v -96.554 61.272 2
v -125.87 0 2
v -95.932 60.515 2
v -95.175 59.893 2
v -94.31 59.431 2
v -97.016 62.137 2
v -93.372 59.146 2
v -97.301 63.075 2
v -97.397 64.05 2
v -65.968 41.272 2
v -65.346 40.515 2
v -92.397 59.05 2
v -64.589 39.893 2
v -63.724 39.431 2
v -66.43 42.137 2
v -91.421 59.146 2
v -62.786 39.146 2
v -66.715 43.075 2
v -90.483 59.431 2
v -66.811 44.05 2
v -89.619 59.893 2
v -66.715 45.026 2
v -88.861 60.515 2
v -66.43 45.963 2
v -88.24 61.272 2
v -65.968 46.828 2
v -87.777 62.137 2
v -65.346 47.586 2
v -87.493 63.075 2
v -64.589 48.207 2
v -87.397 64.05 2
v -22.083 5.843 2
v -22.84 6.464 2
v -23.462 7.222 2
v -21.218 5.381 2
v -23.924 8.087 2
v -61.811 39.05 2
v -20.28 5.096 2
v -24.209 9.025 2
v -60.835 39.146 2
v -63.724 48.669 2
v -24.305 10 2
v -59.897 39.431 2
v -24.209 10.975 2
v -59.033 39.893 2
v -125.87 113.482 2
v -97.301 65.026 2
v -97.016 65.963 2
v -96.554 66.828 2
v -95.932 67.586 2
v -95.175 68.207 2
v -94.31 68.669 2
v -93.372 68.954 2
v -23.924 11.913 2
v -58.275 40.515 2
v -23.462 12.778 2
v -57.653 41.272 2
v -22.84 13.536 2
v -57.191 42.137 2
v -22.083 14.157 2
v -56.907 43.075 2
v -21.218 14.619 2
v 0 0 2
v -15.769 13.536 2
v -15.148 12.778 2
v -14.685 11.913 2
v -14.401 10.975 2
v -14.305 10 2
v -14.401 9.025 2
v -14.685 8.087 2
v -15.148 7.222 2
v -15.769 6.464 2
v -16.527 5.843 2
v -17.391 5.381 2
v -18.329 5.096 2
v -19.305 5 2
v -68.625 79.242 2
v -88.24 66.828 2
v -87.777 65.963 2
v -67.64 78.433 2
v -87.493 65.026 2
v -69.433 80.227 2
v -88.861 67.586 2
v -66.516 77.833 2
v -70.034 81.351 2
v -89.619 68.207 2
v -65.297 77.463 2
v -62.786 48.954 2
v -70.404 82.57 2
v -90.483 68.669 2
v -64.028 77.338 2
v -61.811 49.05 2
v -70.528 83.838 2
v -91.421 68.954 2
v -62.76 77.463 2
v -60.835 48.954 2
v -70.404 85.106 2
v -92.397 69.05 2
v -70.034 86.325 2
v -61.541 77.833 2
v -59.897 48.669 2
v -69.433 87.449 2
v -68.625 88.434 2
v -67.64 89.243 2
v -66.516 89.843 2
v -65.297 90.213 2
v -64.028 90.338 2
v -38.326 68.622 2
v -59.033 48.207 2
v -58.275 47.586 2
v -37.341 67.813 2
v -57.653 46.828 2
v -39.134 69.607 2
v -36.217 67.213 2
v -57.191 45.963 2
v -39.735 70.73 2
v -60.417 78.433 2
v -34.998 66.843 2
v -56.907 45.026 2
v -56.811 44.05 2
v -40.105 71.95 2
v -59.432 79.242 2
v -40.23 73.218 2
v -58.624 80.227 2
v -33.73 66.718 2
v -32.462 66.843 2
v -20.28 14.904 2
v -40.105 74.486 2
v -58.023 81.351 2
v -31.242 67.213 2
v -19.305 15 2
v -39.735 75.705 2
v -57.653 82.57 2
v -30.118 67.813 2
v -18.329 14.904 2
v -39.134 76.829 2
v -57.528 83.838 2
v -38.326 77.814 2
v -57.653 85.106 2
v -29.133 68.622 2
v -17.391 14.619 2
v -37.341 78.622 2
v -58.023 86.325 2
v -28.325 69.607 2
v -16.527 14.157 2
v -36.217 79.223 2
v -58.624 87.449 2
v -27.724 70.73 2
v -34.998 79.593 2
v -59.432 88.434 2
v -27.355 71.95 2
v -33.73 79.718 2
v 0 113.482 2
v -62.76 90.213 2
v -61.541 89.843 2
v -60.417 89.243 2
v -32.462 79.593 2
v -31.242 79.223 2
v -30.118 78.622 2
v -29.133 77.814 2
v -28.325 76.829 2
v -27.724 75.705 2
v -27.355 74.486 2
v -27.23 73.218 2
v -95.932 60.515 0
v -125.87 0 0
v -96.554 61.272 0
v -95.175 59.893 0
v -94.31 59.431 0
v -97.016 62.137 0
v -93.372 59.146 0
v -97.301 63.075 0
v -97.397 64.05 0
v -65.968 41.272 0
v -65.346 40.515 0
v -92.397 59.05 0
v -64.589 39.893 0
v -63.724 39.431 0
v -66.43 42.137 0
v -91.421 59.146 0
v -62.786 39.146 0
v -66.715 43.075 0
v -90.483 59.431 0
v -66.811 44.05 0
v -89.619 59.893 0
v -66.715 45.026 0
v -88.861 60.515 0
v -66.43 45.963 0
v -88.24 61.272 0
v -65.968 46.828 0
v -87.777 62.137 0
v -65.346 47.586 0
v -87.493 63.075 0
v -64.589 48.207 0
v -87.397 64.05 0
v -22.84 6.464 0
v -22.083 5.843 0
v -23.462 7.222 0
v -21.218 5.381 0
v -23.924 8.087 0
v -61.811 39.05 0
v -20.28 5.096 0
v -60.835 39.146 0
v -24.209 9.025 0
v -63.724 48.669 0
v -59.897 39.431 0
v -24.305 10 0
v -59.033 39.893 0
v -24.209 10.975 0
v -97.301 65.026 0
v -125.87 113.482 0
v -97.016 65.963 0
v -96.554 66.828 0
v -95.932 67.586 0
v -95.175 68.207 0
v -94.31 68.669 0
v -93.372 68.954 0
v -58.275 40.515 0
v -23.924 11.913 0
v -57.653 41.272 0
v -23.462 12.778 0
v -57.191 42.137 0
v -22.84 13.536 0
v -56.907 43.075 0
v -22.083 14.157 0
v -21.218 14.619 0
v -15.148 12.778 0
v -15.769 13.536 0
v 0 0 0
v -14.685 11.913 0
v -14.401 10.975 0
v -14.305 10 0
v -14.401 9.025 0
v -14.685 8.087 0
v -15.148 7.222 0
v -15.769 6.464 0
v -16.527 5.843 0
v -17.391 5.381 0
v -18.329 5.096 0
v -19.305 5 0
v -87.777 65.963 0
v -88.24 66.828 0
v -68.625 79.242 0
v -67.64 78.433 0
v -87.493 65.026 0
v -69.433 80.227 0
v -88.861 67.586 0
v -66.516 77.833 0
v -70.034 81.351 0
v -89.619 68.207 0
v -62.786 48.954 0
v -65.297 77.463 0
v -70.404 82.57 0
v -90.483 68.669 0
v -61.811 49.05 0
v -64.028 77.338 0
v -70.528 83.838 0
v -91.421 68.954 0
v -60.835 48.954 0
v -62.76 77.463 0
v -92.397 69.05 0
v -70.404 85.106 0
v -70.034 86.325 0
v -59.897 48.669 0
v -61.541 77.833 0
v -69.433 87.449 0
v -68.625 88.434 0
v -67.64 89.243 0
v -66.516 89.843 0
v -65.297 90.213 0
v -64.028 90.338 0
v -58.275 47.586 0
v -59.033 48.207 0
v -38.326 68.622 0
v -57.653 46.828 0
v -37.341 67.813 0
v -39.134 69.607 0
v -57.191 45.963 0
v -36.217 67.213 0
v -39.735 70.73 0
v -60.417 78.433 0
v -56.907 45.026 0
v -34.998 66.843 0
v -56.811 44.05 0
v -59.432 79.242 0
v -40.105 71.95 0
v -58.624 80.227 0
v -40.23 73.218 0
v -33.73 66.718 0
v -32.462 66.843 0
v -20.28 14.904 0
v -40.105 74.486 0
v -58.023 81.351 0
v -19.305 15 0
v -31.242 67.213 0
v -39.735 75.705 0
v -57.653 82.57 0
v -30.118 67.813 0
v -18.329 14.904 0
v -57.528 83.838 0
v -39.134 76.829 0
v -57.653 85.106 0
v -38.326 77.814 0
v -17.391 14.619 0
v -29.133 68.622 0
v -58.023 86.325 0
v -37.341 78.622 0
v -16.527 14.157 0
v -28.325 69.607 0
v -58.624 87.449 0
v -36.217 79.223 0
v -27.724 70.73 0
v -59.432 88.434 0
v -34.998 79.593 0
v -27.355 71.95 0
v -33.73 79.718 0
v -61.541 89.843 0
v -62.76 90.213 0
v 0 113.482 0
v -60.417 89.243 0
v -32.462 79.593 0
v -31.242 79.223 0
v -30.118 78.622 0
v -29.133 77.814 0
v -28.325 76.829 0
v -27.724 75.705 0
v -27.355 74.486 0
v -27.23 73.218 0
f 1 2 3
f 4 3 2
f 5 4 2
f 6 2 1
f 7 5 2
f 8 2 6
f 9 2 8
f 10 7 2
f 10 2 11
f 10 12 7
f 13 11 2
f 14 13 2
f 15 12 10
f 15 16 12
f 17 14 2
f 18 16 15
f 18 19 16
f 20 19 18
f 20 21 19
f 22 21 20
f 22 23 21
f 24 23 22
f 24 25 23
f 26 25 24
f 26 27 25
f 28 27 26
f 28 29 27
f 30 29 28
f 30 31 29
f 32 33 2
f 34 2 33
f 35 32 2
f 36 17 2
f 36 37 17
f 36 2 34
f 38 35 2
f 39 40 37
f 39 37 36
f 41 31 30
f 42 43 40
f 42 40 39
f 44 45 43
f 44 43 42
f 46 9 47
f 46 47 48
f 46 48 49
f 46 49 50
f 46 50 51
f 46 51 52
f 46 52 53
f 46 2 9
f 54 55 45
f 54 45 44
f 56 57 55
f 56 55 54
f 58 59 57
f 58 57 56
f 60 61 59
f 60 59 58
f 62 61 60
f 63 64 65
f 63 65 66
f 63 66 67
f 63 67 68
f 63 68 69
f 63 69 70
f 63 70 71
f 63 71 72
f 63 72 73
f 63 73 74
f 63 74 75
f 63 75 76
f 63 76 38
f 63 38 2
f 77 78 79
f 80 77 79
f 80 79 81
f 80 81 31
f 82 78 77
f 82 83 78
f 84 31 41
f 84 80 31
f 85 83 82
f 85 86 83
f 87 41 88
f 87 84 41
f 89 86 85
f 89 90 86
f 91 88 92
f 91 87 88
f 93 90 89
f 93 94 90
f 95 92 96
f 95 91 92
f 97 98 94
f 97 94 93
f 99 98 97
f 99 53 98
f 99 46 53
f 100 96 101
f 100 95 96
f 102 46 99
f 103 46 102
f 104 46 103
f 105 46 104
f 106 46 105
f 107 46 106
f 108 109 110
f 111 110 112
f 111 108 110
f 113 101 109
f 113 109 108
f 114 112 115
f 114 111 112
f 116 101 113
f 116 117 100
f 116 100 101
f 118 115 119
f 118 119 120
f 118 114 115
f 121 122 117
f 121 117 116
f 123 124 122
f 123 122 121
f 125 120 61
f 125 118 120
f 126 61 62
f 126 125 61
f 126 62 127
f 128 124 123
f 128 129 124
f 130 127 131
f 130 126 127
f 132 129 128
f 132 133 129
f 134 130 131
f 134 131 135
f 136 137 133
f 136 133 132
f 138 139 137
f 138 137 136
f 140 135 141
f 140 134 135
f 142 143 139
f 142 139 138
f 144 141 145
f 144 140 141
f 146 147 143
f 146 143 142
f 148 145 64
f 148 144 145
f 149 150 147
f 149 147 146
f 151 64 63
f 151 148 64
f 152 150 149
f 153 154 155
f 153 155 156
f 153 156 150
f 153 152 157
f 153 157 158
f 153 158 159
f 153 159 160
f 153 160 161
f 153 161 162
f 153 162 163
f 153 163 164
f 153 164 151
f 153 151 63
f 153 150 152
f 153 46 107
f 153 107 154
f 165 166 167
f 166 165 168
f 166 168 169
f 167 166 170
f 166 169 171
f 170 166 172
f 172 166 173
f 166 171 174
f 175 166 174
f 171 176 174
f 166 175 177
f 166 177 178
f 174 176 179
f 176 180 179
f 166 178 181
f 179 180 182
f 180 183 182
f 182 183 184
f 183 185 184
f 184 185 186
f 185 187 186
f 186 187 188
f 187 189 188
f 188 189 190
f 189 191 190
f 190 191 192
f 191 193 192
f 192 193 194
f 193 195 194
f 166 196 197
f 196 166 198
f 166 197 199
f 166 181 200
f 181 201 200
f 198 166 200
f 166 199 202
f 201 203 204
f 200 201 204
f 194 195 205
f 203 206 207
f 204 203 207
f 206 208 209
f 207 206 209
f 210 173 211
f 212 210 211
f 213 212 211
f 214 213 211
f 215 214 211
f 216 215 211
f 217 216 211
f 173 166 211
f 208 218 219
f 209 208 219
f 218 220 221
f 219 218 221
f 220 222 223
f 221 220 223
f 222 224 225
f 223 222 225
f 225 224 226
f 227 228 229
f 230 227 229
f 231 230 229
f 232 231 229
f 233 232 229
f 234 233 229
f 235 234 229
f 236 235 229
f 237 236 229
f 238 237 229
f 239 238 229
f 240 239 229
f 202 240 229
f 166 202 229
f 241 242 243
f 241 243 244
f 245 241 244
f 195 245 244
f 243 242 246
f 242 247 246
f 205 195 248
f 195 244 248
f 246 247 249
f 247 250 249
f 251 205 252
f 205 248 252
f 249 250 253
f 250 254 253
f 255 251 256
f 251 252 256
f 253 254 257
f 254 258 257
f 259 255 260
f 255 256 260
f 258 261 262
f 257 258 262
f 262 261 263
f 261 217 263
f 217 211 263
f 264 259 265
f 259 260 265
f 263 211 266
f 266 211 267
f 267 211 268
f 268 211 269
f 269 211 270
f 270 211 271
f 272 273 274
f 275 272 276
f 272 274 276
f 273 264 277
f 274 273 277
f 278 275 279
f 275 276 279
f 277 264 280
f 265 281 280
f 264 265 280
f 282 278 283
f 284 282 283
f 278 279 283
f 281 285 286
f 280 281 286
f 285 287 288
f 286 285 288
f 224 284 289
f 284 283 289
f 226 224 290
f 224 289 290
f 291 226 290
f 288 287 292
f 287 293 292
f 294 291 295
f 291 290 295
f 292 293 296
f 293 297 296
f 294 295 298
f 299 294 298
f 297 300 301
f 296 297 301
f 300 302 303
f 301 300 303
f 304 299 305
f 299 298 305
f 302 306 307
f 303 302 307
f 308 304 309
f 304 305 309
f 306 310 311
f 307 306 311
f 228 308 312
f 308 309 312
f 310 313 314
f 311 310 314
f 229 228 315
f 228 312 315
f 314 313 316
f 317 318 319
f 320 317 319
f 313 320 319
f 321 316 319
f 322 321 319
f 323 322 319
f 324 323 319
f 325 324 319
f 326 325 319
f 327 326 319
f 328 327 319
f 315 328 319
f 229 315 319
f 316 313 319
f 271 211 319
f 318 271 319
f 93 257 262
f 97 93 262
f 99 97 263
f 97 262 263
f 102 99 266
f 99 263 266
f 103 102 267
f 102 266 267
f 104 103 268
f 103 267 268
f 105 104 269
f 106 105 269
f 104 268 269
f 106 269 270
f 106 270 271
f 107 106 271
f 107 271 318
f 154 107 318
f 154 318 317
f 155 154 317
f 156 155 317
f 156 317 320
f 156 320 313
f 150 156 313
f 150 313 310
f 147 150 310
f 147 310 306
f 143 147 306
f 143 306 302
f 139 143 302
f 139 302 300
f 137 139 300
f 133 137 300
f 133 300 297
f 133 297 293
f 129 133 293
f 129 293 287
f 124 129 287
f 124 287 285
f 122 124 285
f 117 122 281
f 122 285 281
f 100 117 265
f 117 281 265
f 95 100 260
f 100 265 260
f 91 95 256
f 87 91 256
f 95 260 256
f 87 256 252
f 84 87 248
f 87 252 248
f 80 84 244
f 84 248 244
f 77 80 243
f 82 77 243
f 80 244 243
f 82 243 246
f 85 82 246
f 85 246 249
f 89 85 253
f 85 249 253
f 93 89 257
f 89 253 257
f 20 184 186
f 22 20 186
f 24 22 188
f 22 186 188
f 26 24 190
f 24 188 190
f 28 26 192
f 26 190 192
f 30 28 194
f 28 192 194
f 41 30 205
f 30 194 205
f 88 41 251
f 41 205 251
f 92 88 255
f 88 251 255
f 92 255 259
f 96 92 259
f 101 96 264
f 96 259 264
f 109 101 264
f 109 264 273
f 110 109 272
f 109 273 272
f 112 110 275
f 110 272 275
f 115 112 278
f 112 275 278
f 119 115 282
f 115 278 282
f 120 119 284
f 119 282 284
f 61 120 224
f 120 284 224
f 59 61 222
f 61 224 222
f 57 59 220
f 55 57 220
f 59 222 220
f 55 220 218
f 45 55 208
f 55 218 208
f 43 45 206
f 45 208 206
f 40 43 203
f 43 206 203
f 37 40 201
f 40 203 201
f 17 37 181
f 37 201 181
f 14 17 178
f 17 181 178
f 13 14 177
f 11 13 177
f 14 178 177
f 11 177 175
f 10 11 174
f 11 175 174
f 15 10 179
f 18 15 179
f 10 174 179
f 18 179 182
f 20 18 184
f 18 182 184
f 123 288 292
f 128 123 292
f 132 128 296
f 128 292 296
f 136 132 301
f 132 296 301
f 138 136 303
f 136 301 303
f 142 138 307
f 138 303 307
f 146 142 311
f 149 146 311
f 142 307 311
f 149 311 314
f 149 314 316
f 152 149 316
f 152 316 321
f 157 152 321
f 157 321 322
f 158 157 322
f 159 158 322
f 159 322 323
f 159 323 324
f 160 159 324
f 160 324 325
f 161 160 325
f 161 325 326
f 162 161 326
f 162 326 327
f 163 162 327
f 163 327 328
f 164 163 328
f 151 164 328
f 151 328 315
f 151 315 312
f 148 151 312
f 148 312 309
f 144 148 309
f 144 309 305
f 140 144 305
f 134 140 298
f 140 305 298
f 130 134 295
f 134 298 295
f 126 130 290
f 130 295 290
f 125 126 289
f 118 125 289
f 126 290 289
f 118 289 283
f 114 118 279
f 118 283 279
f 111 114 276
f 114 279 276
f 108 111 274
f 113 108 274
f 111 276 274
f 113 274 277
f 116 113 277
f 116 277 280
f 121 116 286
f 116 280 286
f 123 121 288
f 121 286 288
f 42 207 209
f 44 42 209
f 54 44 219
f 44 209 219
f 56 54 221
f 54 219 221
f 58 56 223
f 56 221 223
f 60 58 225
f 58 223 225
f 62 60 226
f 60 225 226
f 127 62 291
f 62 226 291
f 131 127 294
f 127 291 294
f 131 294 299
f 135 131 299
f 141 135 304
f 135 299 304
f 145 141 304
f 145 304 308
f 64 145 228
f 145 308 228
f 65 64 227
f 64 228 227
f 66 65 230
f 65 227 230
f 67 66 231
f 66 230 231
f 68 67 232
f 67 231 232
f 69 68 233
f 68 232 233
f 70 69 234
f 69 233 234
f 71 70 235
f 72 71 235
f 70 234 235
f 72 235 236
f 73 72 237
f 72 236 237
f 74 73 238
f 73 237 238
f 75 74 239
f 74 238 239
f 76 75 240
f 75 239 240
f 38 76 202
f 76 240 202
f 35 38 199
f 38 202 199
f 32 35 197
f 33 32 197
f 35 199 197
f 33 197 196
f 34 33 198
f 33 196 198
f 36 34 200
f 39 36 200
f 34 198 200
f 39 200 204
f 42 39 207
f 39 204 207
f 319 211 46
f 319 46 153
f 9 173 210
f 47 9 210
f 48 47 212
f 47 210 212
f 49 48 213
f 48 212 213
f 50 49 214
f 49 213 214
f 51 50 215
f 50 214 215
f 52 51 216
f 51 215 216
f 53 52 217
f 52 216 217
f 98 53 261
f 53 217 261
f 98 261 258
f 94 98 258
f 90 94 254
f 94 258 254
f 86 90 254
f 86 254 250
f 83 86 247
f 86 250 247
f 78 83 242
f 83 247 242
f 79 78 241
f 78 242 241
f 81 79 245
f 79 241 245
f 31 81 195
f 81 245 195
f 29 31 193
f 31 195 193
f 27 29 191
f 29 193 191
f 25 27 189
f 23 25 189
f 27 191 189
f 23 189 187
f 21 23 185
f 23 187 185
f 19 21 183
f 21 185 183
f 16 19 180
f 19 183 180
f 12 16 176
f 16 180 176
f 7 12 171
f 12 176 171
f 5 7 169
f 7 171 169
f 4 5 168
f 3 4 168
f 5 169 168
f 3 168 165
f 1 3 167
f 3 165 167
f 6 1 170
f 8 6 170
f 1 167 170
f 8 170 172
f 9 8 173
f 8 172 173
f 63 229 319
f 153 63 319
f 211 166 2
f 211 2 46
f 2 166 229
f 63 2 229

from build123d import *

# Parameters (mm, degrees)
SKETCH1_W                               = 125.870370198
SKETCH1_H                               = 113.481751874
BOSS_EXTRUDE1_DEPTH                     = 2
CBORE_FOR_M5_HEX_HEAD_BOLT1_D           = 5.5
CBORE_FOR_M5_HEX_HEAD_BOLT1_CBORE_D     = 13
CBORE_FOR_M5_HEX_HEAD_BOLT1_CBORE_DEPTH = 3.5
SKETCH4_R                               = 5
CUT_EXTRUDE1_DEPTH                      = 2


with BuildPart() as part:
    # Sketch1 → Boss-Extrude1 (new body)
    with BuildSketch(Plane.XY):
        with Locations((-62.935185099, 56.740875937)):
            Rectangle(SKETCH1_W, SKETCH1_H)
    extrude(amount=BOSS_EXTRUDE1_DEPTH)

    # CBORE for M5 Hex Head Bolt1 (through all)
    with Locations(Plane(origin=(0, 0, 0), x_dir=(-1, 0, 0), z_dir=(0, 0, -1))):
        with Locations((33.729629401, 73.217807093), (64.028441194, 83.838009165)):
            CounterBoreHole(CBORE_FOR_M5_HEX_HEAD_BOLT1_D / 2, CBORE_FOR_M5_HEX_HEAD_BOLT1_CBORE_D / 2, CBORE_FOR_M5_HEX_HEAD_BOLT1_CBORE_DEPTH)

    # Sketch4 → Cut-Extrude1 (cut)
    with BuildSketch(Plane(origin=(0, 0, 0), x_dir=(-1, 0, 0), z_dir=(0, 0, -1))):
        with Locations((19.304896116, 10)):
            Circle(SKETCH4_R)
        with Locations((61.810693115, 44.050073834)):
            Circle(SKETCH4_R)
        with Locations((92.396875082, 64.050073834)):
            Circle(SKETCH4_R)
    extrude(amount=-CUT_EXTRUDE1_DEPTH, mode=Mode.SUBTRACT)


solid = part.part
